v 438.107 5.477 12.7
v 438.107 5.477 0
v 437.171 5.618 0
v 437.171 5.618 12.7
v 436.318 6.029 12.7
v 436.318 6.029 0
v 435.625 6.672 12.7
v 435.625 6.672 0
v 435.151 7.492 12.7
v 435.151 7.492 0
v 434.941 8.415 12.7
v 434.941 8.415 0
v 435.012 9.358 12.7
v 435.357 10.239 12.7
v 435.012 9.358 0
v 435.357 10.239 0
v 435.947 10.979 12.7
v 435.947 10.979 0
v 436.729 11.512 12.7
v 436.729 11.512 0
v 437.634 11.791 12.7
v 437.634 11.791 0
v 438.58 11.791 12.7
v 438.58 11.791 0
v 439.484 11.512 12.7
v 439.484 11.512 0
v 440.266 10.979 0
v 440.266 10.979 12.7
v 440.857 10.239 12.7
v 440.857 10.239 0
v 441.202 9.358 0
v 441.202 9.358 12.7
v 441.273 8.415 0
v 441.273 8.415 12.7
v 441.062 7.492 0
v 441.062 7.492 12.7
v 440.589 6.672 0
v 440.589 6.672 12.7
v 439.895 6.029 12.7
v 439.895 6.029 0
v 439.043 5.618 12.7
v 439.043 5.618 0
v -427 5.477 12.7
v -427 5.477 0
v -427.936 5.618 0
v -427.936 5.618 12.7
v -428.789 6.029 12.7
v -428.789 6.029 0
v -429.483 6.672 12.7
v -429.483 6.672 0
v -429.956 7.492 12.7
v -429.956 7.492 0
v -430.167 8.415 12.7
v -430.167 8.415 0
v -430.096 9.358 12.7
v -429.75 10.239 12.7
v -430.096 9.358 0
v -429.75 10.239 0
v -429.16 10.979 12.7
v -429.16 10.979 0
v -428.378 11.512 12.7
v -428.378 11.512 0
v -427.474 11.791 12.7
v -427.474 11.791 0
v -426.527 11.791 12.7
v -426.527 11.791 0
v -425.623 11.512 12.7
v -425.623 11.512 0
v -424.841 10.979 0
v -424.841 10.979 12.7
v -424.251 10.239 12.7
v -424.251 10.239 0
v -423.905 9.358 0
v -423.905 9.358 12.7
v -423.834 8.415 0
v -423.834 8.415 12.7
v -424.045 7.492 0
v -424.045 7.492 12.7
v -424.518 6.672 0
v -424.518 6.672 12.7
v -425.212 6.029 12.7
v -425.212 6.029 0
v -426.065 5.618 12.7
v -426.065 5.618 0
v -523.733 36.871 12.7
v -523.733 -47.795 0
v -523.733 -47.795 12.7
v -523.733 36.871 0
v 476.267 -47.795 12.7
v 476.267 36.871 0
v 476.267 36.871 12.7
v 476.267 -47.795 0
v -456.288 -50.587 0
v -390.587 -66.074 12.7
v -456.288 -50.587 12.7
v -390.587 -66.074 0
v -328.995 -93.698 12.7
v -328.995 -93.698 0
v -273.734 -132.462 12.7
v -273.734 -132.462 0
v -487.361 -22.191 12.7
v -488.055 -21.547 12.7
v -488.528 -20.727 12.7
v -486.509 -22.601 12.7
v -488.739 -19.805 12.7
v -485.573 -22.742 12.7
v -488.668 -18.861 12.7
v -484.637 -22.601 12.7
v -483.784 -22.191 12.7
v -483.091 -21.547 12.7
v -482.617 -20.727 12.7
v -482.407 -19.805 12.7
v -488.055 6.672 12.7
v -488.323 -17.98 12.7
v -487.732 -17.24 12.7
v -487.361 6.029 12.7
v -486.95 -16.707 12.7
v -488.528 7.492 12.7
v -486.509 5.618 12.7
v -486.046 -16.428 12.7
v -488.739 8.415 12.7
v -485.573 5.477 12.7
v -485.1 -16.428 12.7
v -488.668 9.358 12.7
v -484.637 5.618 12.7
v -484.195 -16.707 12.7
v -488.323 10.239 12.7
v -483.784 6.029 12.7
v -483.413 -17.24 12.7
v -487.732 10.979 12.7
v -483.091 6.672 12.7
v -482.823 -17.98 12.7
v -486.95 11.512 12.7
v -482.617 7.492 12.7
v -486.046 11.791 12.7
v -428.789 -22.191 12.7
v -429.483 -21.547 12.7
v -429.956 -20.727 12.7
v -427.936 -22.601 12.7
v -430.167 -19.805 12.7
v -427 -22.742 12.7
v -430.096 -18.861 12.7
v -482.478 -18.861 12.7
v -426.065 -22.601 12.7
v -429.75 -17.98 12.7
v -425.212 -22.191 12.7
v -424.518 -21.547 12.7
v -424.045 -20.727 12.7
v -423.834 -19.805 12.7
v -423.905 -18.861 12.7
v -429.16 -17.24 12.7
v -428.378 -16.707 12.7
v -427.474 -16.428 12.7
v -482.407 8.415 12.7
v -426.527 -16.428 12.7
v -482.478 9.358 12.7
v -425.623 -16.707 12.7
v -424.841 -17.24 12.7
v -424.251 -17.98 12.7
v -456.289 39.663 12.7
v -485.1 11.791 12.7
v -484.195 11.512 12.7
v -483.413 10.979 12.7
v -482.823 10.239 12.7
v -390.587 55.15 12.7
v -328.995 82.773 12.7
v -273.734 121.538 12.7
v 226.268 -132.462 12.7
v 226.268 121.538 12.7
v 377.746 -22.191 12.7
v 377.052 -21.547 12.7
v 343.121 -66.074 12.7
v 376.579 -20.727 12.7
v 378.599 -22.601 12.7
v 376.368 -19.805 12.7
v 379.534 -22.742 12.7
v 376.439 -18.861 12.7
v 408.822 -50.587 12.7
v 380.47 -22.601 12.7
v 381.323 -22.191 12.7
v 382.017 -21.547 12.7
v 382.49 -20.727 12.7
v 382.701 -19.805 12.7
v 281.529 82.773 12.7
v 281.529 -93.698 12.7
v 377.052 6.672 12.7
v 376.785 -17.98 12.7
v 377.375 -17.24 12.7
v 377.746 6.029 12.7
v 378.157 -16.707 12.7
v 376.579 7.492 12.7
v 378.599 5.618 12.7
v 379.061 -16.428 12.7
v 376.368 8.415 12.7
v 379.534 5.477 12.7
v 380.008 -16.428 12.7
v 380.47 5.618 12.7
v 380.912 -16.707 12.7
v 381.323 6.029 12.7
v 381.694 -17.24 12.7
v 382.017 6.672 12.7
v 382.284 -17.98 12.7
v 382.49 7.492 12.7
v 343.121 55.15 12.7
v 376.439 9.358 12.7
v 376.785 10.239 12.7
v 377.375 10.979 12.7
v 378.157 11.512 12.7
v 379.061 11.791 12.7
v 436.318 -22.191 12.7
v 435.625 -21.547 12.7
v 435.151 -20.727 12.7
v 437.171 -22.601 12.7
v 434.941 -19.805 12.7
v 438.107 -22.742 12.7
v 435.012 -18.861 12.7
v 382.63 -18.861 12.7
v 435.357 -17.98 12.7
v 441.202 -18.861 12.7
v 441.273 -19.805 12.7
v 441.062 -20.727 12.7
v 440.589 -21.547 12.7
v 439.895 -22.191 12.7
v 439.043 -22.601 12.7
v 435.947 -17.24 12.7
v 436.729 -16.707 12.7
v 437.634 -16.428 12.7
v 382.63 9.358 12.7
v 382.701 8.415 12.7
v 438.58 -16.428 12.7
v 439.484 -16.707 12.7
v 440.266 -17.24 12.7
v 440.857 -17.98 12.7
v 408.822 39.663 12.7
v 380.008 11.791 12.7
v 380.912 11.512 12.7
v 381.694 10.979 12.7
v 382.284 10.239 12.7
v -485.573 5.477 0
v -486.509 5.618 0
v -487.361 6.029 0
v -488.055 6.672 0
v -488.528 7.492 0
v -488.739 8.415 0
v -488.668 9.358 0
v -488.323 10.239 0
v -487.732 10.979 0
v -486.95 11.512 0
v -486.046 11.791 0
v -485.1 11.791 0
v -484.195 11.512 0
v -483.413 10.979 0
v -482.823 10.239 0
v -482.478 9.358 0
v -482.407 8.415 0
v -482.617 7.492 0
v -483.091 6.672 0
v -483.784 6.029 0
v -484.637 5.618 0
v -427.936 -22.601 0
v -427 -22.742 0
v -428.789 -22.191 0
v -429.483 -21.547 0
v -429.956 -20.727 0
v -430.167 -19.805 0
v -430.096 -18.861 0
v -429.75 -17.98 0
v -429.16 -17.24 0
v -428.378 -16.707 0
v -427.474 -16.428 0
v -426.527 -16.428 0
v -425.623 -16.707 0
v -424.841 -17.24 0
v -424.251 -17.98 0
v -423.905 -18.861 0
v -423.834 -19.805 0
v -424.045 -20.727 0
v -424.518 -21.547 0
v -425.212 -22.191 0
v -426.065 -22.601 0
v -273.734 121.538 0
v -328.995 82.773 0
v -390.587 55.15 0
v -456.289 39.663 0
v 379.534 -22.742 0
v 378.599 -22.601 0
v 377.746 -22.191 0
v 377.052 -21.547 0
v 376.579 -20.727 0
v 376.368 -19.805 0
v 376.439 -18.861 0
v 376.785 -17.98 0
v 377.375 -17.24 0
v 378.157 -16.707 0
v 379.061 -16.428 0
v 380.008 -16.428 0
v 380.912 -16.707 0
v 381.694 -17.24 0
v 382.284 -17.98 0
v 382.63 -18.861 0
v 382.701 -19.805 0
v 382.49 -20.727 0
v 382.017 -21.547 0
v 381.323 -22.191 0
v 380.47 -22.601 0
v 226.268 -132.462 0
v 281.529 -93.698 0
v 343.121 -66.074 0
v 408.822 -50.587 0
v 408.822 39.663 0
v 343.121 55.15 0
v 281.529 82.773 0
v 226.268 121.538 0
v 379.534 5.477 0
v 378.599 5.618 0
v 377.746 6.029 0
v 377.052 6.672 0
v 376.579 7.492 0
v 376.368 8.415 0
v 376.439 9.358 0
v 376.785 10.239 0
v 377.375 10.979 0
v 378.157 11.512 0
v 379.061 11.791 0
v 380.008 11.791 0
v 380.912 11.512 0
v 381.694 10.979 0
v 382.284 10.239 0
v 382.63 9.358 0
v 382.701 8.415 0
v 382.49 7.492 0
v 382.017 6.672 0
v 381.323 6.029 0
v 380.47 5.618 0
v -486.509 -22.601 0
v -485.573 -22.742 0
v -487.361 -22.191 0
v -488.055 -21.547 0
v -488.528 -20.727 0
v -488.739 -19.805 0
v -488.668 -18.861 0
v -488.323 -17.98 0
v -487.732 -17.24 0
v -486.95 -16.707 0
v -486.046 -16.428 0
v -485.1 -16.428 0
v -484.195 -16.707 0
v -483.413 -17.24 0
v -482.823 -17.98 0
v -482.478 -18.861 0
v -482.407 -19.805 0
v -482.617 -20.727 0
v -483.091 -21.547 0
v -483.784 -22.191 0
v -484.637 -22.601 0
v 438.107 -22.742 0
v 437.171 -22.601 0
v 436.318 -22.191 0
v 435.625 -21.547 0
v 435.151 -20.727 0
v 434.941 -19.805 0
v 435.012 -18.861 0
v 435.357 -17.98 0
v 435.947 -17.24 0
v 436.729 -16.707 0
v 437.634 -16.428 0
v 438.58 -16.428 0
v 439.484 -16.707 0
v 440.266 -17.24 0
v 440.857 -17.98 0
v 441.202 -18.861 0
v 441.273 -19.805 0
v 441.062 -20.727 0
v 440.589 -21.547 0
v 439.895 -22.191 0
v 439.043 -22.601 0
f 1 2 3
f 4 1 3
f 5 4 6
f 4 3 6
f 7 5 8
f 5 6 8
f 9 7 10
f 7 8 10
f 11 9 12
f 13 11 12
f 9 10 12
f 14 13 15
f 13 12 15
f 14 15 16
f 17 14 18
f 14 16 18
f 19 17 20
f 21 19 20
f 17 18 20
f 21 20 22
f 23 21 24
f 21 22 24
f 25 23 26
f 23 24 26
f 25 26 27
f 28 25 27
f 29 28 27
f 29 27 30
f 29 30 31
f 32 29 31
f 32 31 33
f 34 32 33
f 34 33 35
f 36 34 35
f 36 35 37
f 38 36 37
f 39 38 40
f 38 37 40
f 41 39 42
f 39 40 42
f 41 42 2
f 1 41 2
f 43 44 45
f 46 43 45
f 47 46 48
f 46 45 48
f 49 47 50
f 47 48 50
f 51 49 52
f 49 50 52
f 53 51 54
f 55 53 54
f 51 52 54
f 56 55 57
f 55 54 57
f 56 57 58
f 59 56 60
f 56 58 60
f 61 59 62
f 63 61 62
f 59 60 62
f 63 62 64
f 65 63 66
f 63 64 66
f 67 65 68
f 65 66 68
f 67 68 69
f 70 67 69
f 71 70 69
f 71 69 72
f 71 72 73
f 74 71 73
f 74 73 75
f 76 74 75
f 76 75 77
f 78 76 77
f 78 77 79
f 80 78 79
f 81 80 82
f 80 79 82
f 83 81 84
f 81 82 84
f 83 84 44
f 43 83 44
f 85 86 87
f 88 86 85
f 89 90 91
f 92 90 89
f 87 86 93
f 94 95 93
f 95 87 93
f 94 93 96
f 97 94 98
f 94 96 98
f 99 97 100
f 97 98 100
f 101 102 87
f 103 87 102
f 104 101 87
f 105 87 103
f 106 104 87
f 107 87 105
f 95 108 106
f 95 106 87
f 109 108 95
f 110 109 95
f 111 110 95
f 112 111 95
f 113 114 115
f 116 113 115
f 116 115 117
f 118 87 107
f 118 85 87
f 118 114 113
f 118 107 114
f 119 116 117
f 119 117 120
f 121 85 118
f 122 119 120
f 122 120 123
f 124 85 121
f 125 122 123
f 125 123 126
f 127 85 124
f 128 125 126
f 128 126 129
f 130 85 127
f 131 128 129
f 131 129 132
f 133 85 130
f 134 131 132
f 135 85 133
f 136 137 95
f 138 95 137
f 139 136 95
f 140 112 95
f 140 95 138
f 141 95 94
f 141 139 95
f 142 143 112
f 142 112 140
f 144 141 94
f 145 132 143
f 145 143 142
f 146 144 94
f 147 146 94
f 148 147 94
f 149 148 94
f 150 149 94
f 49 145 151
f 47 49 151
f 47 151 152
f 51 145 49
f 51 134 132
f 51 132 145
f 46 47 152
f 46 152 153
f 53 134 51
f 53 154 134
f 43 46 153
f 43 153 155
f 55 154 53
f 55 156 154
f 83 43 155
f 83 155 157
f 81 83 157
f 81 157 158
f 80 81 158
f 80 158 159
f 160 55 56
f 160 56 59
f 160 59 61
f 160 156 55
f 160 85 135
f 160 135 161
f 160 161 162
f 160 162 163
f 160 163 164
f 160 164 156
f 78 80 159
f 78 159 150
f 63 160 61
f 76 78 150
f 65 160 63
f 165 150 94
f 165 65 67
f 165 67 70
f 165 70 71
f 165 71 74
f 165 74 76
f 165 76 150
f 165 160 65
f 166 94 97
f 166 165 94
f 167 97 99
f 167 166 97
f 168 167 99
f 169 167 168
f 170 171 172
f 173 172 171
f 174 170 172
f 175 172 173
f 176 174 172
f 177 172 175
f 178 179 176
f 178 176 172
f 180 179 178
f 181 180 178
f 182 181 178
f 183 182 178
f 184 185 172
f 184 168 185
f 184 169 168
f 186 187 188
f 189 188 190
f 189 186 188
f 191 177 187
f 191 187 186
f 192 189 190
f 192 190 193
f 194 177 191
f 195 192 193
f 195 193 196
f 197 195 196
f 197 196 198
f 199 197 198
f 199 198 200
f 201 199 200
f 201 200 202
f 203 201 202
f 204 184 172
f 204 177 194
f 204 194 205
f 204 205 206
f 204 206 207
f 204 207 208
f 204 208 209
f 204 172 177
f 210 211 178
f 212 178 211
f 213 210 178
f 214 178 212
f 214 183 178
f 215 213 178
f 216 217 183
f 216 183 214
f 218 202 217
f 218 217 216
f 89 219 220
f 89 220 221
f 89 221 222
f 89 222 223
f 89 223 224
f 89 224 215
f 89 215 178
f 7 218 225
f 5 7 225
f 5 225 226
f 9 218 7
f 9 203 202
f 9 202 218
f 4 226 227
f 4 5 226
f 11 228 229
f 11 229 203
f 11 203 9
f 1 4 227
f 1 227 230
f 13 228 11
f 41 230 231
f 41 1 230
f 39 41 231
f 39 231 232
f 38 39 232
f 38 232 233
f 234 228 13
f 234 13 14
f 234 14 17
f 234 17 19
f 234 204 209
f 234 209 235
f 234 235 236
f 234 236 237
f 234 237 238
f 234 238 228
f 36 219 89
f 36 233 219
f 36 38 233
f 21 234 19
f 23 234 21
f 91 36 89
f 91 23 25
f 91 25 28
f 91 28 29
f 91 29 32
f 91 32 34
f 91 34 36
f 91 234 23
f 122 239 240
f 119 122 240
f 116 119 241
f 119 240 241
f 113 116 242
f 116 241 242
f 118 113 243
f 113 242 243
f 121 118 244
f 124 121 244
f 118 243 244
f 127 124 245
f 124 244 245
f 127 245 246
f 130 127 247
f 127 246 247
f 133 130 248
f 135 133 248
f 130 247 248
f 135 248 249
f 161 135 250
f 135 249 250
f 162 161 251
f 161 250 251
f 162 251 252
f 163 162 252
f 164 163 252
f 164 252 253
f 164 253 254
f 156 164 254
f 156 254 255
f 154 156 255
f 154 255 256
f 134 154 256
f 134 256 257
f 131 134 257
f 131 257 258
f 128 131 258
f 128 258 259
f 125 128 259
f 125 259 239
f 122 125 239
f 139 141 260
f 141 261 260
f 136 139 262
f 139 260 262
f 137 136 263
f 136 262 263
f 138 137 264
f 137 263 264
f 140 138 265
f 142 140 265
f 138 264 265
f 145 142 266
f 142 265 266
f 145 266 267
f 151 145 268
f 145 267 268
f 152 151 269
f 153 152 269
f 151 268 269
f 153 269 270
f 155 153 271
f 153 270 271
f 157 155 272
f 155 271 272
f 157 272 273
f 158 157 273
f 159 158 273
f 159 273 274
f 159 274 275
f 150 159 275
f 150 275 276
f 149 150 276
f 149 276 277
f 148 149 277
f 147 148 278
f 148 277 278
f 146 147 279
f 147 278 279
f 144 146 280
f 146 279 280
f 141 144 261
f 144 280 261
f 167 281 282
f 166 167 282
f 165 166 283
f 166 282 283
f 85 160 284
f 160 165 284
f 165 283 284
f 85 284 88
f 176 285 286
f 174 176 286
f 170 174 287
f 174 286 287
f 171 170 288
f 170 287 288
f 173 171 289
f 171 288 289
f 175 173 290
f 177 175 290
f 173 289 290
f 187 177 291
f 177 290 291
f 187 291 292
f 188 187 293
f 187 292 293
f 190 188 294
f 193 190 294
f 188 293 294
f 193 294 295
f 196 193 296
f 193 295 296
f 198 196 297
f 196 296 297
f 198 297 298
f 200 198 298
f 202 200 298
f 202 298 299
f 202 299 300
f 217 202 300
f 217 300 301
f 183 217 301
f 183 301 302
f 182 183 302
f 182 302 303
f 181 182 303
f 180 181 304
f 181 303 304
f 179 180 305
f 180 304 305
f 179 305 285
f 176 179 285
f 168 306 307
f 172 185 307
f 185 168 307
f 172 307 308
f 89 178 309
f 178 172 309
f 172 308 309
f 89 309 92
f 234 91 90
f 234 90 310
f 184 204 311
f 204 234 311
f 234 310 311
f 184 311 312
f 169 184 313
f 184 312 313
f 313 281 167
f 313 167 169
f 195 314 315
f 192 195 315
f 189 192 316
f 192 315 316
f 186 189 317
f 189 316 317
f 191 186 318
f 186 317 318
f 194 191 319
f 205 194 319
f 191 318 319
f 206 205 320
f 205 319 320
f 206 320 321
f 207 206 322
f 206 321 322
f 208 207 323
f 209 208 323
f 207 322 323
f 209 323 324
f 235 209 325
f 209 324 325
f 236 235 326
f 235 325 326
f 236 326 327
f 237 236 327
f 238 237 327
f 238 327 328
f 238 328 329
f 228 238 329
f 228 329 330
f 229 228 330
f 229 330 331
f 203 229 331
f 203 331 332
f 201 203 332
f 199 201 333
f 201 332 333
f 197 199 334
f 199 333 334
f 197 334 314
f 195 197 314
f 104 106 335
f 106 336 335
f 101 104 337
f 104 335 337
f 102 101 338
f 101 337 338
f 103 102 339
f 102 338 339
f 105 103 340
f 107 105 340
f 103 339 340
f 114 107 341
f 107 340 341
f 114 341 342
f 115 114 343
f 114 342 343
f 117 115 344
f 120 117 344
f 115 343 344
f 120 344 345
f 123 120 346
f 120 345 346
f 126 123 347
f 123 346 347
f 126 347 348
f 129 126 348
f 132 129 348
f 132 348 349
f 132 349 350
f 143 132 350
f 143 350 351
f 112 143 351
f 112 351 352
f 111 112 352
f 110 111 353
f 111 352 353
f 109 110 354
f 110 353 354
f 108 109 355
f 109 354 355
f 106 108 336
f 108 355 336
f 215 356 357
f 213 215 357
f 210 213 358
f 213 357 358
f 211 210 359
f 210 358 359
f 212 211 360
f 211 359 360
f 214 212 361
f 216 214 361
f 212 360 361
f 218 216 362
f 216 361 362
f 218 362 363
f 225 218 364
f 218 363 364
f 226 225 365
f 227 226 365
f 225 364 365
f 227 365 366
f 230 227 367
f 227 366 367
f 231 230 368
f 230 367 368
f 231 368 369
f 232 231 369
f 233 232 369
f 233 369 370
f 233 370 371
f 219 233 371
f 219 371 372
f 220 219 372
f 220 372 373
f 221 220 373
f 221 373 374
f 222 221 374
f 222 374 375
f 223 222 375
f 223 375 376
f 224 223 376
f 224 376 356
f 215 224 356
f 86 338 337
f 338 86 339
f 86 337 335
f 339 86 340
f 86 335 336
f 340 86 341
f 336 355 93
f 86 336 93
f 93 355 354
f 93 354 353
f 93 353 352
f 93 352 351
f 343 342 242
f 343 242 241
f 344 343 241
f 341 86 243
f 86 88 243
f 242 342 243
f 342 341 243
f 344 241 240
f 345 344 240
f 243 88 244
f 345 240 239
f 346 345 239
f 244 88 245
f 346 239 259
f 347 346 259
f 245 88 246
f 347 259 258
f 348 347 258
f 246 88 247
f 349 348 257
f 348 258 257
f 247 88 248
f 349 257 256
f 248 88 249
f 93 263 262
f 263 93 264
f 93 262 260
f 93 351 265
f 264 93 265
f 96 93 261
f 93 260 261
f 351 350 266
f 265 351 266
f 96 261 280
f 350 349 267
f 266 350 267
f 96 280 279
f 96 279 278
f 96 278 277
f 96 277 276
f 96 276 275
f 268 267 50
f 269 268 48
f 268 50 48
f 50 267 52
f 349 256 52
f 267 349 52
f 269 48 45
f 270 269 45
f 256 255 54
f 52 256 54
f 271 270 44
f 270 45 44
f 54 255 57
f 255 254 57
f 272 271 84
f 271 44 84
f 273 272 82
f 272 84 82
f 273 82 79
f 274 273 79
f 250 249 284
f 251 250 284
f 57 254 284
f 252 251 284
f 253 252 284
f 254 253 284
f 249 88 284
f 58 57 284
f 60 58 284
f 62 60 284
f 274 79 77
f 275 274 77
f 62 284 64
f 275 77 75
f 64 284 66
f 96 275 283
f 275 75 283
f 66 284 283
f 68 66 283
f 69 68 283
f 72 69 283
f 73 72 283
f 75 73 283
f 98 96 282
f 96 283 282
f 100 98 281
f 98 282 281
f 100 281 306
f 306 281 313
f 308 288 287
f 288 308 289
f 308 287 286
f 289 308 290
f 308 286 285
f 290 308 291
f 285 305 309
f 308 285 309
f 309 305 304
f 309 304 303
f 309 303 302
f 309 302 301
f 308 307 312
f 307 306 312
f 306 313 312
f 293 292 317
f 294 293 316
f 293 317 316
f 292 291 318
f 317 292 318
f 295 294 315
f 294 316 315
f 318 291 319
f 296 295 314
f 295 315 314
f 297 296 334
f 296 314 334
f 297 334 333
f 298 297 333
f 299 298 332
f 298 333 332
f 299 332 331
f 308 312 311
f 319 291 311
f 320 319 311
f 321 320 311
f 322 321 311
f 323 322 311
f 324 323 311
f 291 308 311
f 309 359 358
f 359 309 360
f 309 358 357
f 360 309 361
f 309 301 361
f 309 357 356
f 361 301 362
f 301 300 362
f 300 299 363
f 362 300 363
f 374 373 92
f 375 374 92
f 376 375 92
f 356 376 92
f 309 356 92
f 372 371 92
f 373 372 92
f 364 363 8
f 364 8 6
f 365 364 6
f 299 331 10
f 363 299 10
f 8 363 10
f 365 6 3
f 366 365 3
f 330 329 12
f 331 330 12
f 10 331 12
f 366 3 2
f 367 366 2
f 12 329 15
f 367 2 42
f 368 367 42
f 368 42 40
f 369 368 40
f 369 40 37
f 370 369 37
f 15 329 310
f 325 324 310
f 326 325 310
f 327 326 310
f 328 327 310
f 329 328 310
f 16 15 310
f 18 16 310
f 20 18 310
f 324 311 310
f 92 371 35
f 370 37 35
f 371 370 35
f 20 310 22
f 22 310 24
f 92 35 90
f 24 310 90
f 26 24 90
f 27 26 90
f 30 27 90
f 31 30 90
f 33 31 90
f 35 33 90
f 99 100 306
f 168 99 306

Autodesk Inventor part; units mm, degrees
ref_plane "YZ Plane" through (0, 0, 0) normal (1, 0, 0) x (0, 1, 0)
ref_plane "XZ Plane" through (0, 0, 0) normal (0, 1, 0) x (-1, 0, 0)
ref_plane "XY Plane" through (0, 0, 0) normal (0, 0, 1) x (1, 0, 0)
sketch "Sketch1" plane through (0, 0, 0) normal (0, 0, 1) x (1, 0, 0)
  line L0 (726.3915, 245.3629) -> (1226.3925, 245.3629)
  line L1 (1476.392, 160.6963) -> (1476.392, 76.0296)
  line L2 (476.392, 76.0296) -> (476.392, 160.6963)
  arc A0 (476.392, 160.6963) -> (726.3915, 245.3629) centre (495.472, 515.784) ccw
  line L3 (1476.392, 118.3629) -> (476.392, 118.3629) construction
  line L4 (976.392, -8.6371) -> (976.392, 245.3629) construction
  arc A1 (726.3915, -8.6371) -> (476.392, 76.0296) centre (495.472, -279.0582) ccw
  arc A2 (1226.3925, 245.3629) -> (1476.392, 160.6963) centre (1457.312, 515.784) ccw
  arc A3 (1476.392, 76.0296) -> (1226.3925, -8.6371) centre (1457.312, -279.0582) ccw
  line L5 (726.3915, -8.6371) -> (1226.3925, -8.6371)
  point P0 (0, 0)
  dimension "d4" = 355.6
  dimension "d5" = 254
  dimension "d6" = 84.6667
extrude "Extrusion1" add sketch "Sketch1" along normal blind 12.7
sketch "Sketch2" plane through (0, 0, 12.7) normal (0, 0, 1) x (1, 0, 0)
  point P0 (0, 0)
move or copy body "Move Body1" bodies to move or copy 1 copy no translate (-1000.125, -123.825, 0)
sketch "Sketch3" plane through (-273.7335, 121.5379, 12.7) normal (0, 0, 1) x (1, 0, 0)
  line L0 (-249.9995, -84.6667) -> (-249.9995, -169.3333) construction
  arc A0 (750.0005, -169.3333) -> (500.001, -254) centre (730.9205, -524.4211) ccw projected
  line L1 (-249.9995, -84.6667) -> (750.0005, -84.6667) construction
  line L2 (750.0005, -84.6667) -> (750.0005, -169.3333) construction
  line L3 (750.0005, -169.3333) -> (-249.9995, -169.3333) construction
  line L4 (-249.9995, -169.3333) -> (-249.9995, -84.6667) construction
  line L5 (-249.9995, -84.6667) -> (-249.9995, -112.8861) construction
  line L6 (750.0005, -169.3333) -> (750.0005, -84.6667) construction
  line L7 (-249.9995, -112.8861) -> (750.0005, -112.8861) construction
  line L8 (750.0005, -112.8861) -> (750.0005, -141.1055) construction
  line L9 (750.0005, -141.1055) -> (-249.9995, -141.1055) construction
  line L10 (-249.9995, -141.1055) -> (-249.9995, -112.8861) construction
  arc A1 (-249.9995, -84.6667) -> (0, 0) centre (-230.9195, 270.4211) ccw projected
  line L11 (-211.8394, -84.6667) -> (-211.8394, -169.3333) construction
  arc A2 (0, -254) -> (-249.9995, -169.3333) centre (-230.9195, -524.4211) ccw projected
  line L12 (-211.8394, -84.6667) -> (-153.2669, -84.6667) construction
  line L13 (-153.2669, -84.6667) -> (-153.2669, -169.3333) construction
  line L14 (-153.2669, -169.3333) -> (-211.8394, -169.3333) construction
  line L15 (-211.8394, -169.3333) -> (-211.8394, -84.6667) construction
  line L16 (500.001, 0) -> (0, 0) projected
  line L17 (250.0005, 0) -> (250.0005, -254) construction
  point P0 (273.7335, -121.5379)
  point P1 (-211.8394, -112.8861)
  point P2 (-211.8394, -141.1055)
  point P3 (-153.2669, -112.8861)
  point P4 (-153.2669, -141.1055)
  point P5 (711.8404, -112.8861)
  point P6 (711.8404, -141.1055)
  point P7 (653.2679, -112.8861)
  point P8 (653.2679, -141.1055)
  dimension "d15" = 28.2194
  dimension "d16" = 28.2194
hole "Hole1" at (-485.5729, 8.6519, 12.7) at (-427.0004, 8.6519, 12.7) at (-485.5729, -19.5675, 12.7) at (-427.0004, -19.5675, 12.7) at (379.5345, 8.6519, 12.7) at (438.1069, 8.6519, 12.7) at (438.1069, -19.5675, 12.7) at (379.5345, -19.5675, 12.7) direction (0, 0, -1) diameter 6.35 end through all
thread "Thread1" size "1/4-20 UNC" class "2B" standard "ANSI Unified Screw Threads" full length
properties part number "Electric Skateboard Deck"
